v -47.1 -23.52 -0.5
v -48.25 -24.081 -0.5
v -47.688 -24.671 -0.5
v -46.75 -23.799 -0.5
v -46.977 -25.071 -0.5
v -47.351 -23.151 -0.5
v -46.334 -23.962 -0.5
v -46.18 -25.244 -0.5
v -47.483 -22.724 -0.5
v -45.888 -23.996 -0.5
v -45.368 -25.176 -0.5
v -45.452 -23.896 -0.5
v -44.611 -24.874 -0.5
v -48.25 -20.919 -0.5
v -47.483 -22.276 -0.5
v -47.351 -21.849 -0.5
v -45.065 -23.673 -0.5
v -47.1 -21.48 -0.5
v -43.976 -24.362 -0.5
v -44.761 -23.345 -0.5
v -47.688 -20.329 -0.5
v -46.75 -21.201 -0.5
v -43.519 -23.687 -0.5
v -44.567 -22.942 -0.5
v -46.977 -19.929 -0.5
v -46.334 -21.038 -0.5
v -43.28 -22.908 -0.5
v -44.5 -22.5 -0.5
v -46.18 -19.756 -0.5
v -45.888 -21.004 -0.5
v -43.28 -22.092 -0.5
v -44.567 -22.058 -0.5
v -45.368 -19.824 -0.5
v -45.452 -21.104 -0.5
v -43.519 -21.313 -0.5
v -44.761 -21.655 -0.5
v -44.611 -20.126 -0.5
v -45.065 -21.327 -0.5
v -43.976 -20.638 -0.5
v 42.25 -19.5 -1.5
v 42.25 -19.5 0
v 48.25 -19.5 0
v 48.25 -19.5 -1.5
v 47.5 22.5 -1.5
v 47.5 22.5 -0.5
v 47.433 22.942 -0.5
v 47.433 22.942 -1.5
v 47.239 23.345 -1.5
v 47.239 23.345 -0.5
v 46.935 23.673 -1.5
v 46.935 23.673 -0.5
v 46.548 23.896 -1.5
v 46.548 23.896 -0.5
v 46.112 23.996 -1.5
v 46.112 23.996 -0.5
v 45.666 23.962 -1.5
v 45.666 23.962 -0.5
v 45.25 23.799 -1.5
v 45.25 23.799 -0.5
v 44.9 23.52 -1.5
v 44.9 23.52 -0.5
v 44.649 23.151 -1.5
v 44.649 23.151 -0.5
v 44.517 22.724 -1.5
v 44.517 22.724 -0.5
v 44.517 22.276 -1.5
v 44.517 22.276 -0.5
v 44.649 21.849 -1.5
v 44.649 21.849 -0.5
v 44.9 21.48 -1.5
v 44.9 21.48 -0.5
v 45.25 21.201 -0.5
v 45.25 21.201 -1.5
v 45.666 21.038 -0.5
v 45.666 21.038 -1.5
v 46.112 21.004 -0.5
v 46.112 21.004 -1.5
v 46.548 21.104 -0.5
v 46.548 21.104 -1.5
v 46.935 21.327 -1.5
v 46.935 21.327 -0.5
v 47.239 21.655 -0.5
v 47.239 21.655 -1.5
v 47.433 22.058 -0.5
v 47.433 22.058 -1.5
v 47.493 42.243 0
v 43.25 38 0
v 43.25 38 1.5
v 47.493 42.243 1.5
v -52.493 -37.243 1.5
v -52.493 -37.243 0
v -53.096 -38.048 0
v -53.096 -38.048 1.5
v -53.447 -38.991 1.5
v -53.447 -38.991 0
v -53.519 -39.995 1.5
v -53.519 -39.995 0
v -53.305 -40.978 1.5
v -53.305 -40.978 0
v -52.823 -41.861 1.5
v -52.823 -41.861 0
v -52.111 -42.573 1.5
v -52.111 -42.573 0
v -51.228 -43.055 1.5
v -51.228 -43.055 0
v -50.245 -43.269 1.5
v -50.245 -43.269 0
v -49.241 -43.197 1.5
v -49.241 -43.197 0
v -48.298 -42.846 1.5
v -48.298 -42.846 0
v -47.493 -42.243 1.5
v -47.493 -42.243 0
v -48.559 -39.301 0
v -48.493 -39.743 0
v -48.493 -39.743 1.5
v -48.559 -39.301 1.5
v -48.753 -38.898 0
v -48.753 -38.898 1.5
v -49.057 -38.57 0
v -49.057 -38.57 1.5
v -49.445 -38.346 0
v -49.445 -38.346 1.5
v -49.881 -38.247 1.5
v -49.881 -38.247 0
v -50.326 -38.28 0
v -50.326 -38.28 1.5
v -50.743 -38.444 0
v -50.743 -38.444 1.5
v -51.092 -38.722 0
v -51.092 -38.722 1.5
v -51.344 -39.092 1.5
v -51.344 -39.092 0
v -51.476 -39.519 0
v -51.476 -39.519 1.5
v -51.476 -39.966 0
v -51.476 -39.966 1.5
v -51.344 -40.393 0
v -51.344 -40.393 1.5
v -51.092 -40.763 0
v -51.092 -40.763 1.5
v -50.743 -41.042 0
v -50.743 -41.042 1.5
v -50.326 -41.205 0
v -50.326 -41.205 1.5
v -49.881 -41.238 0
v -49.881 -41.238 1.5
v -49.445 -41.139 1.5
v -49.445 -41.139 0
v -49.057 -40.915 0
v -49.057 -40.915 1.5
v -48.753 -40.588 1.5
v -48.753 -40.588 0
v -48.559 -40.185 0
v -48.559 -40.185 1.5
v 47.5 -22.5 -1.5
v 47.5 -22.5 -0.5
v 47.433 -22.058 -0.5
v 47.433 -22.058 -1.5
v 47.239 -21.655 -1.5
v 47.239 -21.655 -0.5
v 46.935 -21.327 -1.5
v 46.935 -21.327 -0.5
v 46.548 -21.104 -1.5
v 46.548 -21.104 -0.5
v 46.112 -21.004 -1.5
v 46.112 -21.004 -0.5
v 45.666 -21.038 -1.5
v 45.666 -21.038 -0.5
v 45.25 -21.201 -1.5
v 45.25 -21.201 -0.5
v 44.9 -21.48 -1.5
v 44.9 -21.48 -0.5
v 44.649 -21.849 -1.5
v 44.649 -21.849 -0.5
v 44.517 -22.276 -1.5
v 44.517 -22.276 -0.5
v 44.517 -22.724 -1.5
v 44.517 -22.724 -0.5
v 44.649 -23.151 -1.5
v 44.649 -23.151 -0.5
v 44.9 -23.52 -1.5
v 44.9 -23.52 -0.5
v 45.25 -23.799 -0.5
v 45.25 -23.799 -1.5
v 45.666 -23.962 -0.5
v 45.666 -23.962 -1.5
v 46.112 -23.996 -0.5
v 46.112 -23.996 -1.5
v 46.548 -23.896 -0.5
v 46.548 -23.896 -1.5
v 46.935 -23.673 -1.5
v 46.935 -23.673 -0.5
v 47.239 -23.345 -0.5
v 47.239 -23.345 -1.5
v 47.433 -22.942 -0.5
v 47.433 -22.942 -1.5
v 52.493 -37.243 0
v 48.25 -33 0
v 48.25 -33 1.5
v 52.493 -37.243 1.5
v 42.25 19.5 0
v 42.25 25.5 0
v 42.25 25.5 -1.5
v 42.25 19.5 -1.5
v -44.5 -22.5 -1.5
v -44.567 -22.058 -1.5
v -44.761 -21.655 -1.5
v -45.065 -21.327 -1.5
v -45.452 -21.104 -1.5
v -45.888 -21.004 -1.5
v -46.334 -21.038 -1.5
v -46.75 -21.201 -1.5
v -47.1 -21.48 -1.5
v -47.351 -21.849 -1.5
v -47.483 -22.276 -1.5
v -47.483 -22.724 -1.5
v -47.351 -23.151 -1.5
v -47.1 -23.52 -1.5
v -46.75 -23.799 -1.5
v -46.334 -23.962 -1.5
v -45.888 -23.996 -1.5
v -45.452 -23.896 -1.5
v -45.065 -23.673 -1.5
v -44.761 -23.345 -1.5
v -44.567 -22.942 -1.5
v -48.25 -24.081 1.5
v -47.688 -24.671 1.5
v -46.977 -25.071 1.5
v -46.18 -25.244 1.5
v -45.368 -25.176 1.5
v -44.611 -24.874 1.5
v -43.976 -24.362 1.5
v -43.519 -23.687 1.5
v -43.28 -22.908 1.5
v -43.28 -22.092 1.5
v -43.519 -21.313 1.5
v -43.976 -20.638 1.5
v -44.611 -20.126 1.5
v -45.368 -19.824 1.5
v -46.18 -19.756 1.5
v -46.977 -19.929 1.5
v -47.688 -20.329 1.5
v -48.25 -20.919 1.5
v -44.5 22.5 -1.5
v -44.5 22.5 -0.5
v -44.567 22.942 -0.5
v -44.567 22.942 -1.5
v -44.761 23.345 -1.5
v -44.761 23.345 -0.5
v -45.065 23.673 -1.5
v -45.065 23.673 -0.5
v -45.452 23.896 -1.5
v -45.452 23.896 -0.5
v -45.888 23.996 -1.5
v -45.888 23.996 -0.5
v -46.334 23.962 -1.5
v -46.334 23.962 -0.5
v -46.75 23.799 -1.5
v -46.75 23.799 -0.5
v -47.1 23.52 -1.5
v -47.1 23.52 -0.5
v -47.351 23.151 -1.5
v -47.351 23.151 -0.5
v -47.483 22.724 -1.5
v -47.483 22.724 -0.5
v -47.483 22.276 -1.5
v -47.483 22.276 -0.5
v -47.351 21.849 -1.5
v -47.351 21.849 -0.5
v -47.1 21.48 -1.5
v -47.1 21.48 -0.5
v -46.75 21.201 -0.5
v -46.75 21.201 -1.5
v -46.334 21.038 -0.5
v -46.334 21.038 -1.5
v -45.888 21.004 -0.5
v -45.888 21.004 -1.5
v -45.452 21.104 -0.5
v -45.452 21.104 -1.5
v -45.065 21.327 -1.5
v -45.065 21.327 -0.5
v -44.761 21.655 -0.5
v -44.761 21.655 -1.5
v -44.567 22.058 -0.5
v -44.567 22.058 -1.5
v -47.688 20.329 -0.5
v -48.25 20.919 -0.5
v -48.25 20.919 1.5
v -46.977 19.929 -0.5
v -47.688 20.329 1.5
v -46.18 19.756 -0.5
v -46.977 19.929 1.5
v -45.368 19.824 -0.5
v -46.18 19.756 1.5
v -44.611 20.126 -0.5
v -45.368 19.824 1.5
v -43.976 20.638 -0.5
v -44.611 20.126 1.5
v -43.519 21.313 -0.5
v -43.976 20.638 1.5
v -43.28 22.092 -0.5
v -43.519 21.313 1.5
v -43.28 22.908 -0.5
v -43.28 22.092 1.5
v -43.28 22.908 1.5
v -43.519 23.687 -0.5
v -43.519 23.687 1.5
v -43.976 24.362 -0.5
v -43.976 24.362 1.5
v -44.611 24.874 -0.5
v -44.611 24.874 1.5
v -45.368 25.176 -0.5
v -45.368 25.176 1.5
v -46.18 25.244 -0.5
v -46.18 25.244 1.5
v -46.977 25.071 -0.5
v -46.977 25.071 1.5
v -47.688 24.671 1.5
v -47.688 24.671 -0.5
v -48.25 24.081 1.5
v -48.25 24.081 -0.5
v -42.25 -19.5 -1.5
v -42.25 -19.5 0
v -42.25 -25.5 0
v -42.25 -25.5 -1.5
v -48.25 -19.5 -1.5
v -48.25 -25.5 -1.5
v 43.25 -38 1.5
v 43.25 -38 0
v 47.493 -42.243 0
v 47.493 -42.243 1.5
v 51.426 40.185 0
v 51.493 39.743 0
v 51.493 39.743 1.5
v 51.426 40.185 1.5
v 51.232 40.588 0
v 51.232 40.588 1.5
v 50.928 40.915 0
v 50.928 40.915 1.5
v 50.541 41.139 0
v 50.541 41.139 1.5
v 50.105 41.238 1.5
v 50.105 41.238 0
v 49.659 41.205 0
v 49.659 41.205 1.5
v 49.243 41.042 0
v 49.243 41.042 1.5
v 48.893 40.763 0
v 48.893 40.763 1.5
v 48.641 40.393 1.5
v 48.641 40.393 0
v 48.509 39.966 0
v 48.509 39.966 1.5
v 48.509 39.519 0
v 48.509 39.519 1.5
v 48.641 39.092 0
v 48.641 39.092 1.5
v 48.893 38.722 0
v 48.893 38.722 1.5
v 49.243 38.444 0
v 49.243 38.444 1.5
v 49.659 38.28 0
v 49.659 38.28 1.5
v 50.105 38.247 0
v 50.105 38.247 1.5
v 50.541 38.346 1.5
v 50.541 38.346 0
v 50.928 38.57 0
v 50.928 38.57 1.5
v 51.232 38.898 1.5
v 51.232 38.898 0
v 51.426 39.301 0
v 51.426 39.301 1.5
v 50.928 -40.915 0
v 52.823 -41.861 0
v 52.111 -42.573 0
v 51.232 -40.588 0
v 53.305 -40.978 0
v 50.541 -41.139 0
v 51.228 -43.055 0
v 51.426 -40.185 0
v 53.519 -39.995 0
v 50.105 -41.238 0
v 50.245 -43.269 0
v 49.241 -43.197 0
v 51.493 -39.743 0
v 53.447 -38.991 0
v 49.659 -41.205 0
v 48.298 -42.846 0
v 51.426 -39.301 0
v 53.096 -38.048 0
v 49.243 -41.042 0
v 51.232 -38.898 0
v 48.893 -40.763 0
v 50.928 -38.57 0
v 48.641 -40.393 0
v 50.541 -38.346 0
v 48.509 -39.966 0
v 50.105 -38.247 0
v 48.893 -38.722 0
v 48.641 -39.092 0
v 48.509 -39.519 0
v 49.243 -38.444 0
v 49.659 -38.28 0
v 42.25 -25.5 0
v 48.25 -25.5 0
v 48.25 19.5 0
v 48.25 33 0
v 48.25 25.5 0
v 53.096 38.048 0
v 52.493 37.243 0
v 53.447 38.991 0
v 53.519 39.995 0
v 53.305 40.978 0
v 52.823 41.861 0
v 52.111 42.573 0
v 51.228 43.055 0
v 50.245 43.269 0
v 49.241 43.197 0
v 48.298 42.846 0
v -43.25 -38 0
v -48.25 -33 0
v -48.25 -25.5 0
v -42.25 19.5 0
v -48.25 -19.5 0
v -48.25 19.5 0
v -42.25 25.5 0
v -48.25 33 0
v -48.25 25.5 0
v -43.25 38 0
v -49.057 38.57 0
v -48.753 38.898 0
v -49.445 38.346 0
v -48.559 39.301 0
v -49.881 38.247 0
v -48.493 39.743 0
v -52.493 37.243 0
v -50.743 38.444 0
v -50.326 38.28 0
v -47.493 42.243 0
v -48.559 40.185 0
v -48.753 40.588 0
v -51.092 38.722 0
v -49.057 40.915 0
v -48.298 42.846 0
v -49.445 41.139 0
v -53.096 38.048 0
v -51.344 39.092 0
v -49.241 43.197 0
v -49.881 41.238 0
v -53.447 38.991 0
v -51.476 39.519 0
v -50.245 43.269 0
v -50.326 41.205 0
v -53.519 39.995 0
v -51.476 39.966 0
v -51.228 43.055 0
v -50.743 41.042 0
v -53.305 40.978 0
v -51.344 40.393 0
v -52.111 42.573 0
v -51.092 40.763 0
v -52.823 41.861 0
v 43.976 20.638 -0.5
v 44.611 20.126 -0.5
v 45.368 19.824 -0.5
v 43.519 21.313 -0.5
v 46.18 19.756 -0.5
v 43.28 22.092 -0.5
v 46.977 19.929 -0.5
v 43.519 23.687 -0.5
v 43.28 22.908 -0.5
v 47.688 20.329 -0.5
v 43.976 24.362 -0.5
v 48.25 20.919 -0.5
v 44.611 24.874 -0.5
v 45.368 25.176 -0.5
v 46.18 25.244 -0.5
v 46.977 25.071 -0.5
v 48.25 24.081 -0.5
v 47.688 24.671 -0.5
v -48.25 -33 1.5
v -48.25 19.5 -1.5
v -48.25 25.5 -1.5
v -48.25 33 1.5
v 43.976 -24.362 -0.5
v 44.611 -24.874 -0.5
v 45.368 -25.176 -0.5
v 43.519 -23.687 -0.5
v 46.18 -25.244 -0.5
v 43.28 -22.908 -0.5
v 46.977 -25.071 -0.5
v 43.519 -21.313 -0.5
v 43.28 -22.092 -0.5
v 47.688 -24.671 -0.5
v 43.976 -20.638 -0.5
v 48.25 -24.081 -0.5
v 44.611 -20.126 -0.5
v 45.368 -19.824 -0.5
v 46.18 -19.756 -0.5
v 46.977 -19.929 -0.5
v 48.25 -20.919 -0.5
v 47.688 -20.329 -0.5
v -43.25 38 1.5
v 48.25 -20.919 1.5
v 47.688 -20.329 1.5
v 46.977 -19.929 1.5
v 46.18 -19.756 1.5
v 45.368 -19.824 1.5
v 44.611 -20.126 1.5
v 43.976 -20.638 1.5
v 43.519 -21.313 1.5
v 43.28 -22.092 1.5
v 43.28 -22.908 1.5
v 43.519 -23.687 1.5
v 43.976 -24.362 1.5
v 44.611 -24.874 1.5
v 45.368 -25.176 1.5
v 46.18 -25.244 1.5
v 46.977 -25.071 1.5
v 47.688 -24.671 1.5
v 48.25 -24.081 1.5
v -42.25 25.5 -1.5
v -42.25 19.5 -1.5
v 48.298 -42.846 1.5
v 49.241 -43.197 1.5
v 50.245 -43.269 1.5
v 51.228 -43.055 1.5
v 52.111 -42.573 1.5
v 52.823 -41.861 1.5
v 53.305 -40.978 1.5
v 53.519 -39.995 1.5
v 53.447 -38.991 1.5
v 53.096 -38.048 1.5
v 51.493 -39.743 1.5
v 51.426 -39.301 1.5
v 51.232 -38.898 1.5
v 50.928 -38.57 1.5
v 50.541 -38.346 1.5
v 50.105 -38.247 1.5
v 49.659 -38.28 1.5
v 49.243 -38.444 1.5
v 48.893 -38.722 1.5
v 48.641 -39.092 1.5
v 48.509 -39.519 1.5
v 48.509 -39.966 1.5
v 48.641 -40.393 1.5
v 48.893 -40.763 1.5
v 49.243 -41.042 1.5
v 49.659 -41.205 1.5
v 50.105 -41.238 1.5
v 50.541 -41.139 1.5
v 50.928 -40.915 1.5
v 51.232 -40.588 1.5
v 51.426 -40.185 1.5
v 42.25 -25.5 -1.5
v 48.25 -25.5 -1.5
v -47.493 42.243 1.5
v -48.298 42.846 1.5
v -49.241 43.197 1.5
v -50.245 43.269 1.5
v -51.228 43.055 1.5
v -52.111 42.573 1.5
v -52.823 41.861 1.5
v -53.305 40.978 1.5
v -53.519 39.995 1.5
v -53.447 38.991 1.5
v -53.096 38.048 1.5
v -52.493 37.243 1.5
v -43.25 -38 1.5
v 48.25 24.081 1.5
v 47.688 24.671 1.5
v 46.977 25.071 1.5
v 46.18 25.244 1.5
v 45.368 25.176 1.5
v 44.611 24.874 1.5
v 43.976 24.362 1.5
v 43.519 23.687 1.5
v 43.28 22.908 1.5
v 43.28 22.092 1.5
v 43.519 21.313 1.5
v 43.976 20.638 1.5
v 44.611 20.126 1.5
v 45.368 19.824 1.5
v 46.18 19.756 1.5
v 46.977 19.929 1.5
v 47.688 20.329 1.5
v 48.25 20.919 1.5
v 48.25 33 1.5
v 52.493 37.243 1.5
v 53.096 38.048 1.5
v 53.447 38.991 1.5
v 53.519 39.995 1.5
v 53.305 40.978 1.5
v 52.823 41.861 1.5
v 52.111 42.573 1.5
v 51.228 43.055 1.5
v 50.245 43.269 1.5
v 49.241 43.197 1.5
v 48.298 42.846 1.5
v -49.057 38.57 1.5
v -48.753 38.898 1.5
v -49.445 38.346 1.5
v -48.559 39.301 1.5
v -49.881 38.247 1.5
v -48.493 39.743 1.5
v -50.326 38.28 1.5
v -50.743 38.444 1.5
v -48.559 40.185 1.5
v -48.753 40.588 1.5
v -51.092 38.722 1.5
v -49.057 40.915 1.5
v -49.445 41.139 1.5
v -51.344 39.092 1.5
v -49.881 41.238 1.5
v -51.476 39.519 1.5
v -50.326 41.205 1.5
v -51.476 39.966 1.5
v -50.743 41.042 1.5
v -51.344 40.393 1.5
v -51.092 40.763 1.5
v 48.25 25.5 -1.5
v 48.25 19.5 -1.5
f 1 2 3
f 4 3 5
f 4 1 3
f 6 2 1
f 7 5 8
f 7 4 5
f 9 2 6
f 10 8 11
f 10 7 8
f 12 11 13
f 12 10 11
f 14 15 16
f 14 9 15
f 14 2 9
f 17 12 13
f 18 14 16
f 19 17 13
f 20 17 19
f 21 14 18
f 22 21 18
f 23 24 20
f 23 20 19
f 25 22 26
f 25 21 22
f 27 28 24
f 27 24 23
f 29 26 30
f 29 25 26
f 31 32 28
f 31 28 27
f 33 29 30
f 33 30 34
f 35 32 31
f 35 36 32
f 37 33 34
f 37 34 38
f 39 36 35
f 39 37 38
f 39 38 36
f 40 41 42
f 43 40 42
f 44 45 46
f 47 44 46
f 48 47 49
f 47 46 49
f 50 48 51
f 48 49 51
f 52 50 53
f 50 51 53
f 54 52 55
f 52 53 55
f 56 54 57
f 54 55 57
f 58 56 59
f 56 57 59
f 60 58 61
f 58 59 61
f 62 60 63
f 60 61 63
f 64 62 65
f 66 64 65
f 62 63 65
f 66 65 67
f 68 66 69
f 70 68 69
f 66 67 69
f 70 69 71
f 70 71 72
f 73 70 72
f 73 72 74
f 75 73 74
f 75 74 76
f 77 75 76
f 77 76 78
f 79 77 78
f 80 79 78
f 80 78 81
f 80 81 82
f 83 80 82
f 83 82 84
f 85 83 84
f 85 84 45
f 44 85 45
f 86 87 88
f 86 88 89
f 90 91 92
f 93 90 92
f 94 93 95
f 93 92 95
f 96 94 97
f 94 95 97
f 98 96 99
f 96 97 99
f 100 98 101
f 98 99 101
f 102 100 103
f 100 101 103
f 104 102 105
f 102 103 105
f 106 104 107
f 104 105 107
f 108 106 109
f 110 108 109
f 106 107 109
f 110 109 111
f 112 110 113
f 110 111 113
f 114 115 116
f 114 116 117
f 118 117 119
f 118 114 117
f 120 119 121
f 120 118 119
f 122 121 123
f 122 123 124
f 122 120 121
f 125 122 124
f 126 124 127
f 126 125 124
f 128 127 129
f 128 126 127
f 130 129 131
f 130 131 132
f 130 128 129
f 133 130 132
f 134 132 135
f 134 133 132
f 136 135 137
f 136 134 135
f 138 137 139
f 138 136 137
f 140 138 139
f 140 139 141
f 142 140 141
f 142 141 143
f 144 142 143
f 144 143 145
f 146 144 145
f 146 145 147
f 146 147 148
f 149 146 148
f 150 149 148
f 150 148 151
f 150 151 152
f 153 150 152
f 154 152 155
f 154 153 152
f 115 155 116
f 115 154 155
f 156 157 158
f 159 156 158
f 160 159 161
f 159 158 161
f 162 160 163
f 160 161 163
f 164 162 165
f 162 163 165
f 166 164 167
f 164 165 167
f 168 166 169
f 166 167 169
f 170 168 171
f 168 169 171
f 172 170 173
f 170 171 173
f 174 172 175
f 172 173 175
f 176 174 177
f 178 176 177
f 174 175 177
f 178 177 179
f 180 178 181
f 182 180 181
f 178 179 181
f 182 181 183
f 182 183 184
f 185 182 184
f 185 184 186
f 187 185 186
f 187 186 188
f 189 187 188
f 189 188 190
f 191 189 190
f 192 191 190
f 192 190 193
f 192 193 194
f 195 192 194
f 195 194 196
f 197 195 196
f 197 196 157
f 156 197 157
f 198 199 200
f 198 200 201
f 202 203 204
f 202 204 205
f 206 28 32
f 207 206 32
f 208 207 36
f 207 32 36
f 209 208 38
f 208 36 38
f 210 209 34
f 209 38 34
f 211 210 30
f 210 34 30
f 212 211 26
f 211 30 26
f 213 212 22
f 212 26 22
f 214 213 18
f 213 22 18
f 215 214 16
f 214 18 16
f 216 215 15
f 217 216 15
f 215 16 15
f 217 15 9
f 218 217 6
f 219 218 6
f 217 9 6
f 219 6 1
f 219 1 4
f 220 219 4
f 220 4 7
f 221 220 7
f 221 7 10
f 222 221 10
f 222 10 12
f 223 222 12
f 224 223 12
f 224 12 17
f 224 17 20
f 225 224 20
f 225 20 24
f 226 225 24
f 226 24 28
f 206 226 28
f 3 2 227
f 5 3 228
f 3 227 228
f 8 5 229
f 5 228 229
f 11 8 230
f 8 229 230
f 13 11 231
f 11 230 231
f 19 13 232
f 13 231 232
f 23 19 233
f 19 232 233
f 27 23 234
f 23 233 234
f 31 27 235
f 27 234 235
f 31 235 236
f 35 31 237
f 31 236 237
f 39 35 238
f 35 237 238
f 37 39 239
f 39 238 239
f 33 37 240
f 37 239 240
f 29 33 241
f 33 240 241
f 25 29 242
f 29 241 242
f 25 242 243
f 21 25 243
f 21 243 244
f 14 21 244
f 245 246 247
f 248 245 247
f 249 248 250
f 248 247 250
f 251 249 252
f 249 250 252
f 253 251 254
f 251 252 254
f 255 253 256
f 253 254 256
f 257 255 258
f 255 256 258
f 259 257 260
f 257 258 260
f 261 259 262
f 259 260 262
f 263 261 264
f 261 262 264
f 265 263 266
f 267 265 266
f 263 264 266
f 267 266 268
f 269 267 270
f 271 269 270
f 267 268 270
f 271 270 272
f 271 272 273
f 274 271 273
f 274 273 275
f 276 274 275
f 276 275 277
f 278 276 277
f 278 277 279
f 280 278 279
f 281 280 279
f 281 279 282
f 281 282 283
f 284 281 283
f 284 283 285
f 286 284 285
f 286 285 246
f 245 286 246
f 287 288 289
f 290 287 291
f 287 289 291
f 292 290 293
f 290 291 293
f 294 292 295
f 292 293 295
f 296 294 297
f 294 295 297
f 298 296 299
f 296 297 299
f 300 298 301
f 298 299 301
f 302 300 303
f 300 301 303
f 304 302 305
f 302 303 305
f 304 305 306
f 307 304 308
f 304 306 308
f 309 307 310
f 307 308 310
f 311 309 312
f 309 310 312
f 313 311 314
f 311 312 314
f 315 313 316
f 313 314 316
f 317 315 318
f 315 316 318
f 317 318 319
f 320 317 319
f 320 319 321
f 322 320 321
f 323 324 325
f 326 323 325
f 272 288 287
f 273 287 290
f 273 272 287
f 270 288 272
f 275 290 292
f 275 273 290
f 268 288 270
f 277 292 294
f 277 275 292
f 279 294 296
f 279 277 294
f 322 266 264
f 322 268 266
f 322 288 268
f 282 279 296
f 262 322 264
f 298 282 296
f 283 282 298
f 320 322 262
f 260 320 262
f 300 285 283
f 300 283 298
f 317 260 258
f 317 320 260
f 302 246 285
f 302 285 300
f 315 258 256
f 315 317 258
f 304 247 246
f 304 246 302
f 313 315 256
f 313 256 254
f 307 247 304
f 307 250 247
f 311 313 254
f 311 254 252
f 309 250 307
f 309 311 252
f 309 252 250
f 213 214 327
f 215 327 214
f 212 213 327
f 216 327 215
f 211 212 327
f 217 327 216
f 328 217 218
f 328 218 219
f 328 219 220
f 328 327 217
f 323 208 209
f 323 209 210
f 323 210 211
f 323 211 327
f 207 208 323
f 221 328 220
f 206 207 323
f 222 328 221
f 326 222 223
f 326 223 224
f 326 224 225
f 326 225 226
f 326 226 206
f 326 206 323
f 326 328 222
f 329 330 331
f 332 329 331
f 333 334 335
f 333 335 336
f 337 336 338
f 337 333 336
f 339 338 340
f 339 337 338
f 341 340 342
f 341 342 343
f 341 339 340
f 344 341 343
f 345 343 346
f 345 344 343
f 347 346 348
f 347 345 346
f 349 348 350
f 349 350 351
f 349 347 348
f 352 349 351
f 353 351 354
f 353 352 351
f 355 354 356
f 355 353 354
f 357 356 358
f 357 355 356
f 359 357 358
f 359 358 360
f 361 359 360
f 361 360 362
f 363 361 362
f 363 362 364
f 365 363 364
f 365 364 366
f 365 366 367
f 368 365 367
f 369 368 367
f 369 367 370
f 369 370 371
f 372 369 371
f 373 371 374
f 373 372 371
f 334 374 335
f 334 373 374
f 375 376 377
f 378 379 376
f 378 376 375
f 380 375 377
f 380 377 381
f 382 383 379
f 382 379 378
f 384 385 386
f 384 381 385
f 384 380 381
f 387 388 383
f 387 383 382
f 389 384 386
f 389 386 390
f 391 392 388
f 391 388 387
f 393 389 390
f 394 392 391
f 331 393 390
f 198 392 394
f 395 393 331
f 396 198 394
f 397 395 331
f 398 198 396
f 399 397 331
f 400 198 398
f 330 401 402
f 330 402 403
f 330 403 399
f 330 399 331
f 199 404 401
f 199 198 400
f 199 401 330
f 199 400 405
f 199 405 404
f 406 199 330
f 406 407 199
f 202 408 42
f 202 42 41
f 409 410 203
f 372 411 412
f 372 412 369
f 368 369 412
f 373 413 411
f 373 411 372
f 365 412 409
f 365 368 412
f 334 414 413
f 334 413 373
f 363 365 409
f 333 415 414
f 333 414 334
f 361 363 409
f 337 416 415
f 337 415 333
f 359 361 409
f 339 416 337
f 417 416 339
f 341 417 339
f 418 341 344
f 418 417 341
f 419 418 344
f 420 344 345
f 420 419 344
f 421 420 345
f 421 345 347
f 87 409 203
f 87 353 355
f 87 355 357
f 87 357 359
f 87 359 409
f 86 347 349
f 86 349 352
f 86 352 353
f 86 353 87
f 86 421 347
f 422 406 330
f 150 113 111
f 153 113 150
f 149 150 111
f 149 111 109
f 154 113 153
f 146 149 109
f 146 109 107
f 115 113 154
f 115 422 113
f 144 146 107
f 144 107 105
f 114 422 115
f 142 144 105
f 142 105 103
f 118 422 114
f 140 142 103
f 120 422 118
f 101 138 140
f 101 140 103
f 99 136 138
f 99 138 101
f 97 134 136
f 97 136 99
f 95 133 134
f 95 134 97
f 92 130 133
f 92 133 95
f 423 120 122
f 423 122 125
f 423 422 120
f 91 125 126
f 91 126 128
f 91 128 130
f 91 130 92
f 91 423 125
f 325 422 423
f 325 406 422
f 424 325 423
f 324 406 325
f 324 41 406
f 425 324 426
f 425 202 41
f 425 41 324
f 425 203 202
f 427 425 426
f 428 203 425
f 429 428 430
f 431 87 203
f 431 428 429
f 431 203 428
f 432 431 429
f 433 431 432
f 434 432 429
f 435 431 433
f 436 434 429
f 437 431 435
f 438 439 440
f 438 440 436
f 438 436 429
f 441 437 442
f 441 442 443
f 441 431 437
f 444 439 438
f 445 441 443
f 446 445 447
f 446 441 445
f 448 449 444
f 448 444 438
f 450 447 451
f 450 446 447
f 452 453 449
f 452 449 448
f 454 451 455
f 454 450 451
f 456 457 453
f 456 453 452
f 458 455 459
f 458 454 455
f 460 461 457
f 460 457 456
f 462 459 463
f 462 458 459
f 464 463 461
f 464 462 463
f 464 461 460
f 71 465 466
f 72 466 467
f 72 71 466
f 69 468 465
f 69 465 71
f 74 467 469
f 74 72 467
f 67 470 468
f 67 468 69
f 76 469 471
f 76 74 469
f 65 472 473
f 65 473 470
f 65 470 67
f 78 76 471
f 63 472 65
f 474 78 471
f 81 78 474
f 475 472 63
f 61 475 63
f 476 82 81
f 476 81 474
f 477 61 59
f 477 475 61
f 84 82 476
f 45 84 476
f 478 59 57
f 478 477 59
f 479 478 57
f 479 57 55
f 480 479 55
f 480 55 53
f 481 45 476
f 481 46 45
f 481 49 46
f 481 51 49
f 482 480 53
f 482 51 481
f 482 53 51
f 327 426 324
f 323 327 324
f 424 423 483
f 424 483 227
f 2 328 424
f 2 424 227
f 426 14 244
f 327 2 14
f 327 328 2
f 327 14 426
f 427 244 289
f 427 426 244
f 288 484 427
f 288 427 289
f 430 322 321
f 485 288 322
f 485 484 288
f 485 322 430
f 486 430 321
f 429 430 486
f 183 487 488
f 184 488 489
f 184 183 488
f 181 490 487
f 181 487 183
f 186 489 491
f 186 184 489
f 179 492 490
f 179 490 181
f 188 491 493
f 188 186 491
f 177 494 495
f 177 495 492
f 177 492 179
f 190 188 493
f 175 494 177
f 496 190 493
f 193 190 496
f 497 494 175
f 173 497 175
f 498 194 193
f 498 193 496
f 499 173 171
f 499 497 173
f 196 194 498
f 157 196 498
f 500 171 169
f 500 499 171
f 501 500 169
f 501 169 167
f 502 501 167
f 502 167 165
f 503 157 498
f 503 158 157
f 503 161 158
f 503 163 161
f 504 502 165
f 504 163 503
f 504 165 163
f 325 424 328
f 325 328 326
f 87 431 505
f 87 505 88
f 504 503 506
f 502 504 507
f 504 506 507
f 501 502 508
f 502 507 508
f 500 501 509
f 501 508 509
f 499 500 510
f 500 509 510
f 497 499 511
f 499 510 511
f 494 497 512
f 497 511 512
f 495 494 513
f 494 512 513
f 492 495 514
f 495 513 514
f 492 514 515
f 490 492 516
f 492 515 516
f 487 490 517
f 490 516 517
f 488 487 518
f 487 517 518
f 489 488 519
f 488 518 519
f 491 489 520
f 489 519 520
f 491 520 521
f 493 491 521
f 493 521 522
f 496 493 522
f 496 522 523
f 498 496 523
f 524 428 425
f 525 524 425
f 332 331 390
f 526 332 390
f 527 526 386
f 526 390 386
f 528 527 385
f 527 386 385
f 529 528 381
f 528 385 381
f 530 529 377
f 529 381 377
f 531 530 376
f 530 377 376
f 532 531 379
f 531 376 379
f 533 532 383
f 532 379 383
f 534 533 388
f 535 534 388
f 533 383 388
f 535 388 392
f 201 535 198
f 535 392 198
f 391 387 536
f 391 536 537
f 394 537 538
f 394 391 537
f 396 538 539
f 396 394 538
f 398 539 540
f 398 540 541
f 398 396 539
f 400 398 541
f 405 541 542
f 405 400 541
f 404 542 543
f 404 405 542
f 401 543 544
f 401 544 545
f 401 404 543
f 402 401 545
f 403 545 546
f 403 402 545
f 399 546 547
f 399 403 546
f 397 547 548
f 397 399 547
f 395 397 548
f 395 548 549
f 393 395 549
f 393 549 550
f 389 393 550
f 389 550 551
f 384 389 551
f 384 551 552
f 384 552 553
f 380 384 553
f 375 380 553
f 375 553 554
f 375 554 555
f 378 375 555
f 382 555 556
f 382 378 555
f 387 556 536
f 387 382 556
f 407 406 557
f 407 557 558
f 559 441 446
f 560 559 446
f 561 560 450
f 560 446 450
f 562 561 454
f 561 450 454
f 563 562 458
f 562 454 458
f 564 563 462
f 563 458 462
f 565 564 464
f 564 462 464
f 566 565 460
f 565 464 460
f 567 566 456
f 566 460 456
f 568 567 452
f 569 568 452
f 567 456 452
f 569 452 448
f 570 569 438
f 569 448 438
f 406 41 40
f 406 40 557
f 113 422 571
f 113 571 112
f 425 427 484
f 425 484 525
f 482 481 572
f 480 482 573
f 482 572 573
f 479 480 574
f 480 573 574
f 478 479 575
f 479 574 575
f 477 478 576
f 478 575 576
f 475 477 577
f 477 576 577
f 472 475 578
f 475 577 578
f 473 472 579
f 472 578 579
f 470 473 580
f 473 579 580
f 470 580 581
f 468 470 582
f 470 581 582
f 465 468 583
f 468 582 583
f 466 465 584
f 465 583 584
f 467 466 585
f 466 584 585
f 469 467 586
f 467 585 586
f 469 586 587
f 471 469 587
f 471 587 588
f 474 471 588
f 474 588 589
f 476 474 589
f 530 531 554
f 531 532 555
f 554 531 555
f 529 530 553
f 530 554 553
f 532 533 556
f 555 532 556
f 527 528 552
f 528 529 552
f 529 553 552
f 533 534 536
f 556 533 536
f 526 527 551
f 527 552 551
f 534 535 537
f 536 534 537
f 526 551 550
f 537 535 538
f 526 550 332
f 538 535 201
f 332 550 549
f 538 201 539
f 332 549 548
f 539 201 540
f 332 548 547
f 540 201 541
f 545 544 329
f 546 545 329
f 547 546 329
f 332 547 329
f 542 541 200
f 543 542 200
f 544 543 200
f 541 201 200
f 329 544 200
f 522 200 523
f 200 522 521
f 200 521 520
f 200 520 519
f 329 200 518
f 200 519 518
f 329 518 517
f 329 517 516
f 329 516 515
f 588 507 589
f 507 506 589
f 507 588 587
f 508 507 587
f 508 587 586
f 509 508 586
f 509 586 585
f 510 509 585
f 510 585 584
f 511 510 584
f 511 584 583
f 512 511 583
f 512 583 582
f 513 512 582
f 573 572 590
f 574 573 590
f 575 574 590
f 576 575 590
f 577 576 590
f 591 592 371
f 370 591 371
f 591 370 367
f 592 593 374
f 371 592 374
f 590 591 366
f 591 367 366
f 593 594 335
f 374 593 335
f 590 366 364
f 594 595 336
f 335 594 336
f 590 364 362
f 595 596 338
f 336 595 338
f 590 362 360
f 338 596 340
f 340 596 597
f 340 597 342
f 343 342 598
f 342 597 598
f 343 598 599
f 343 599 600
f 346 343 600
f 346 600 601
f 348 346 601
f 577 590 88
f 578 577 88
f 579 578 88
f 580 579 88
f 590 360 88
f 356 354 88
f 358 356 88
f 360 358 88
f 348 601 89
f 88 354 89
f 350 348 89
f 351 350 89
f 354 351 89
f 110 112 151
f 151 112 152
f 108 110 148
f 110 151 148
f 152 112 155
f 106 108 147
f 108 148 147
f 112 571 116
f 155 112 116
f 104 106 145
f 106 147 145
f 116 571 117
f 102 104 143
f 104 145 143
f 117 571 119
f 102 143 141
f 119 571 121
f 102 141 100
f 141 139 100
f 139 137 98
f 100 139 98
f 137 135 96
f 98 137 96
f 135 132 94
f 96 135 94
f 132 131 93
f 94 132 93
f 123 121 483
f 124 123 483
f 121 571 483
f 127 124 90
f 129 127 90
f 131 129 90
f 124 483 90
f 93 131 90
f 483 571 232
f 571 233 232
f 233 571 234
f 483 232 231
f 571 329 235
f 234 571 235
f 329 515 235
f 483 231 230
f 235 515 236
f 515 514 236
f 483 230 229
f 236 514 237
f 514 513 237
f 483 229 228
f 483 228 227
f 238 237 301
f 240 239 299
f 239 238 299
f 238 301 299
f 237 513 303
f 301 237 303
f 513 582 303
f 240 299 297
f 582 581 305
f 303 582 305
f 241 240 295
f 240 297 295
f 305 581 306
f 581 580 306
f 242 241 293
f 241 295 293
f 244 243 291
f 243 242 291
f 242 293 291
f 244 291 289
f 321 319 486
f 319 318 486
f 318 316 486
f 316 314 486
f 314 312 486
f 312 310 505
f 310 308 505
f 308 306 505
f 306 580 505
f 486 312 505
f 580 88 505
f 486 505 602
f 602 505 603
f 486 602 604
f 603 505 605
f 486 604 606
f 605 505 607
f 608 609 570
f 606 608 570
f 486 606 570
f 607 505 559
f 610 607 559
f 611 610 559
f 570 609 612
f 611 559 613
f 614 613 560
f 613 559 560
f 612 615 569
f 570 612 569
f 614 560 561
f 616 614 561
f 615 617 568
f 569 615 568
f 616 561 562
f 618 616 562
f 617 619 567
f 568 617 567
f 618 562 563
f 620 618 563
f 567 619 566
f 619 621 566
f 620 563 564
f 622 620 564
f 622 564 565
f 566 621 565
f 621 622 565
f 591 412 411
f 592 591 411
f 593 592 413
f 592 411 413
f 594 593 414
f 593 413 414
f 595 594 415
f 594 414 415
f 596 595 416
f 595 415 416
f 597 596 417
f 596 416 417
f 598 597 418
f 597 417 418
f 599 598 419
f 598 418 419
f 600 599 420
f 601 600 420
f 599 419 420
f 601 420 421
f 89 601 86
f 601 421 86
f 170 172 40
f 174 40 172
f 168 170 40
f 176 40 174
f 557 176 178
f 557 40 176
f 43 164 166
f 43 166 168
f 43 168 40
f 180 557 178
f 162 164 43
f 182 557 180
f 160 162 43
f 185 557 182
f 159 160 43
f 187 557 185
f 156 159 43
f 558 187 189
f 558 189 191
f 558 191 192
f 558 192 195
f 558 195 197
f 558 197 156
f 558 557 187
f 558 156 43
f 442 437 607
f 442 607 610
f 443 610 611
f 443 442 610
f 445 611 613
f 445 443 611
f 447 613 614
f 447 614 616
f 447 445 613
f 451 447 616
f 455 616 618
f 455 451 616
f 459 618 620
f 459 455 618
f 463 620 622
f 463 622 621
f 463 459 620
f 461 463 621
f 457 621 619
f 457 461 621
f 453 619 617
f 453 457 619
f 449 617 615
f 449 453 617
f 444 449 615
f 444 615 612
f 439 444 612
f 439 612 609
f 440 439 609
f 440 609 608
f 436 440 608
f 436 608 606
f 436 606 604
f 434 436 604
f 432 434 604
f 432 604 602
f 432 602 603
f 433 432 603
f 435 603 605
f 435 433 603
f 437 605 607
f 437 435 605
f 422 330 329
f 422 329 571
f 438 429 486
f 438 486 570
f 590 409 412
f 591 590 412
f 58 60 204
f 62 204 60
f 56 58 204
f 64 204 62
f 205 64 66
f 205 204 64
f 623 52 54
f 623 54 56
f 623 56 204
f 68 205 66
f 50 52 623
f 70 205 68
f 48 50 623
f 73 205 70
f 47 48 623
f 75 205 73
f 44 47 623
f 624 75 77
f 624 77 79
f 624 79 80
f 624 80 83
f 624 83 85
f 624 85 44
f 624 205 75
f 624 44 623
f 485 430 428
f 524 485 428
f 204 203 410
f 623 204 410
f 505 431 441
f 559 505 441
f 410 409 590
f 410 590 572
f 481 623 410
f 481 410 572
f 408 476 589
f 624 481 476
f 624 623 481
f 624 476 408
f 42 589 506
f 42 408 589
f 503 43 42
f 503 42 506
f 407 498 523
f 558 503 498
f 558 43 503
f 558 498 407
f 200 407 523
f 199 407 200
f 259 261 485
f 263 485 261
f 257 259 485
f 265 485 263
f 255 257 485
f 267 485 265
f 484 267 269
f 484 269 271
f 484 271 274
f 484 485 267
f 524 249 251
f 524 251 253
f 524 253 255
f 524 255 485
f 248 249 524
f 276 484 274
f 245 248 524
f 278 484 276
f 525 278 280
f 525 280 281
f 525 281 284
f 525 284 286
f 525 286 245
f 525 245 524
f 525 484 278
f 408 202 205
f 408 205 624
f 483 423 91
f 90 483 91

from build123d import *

# Parameters (mm, degrees)
SKETCH_R        = 1.5
PAD_DEPTH       = 1.5
SKETCH001_W     = 6
SKETCH001_H     = 6
PAD001_DEPTH    = 1.5
SKETCH002_R     = 1.5
POCKET_DEPTH    = 3.001
SKETCH003_R     = 2.75
POCKET001_DEPTH = 2


with BuildPart() as part:
    # Sketch → Pad (new body)
    with BuildSketch(Plane.XY):
        with BuildLine():
            Line((-48.25, -33), (-48.25, 33))
            Line((-48.25, 33), (-52.492641, 37.242641))
            ThreePointArc((-47.492641, 42.242641), (-52.492641, 42.242641), (-52.492641, 37.242641))
            Line((-43.25, 38), (-47.492641, 42.242641))
            Line((-43.25, 38), (43.25, 38))
            Line((43.25, 38), (47.492641, 42.242641))
            ThreePointArc((52.492641, 37.242641), (52.492641, 42.242641), (47.492641, 42.242641))
            Line((48.25, 33), (52.492641, 37.242641))
            Line((48.25, 33), (48.25, -33))
            Line((48.25, -33), (52.492641, -37.242641))
            ThreePointArc((47.492641, -42.242641), (52.492641, -42.242641), (52.492641, -37.242641))
            Line((43.25, -38), (47.492641, -42.242641))
            Line((43.25, -38), (-43.25, -38))
            Line((-43.25, -38), (-47.492641, -42.242641))
            ThreePointArc((-52.492641, -37.242641), (-52.492641, -42.242641), (-47.492641, -42.242641))
            Line((-48.25, -33), (-52.492641, -37.242641))
        make_face()
        with Locations((49.992641, -39.742641)):
            Circle(SKETCH_R, mode=Mode.SUBTRACT)
        with Locations((-49.992641, -39.742641)):
            Circle(SKETCH_R, mode=Mode.SUBTRACT)
        with Locations((-49.992641, 39.742641)):
            Circle(SKETCH_R, mode=Mode.SUBTRACT)
        with Locations((49.992641, 39.742641)):
            Circle(SKETCH_R, mode=Mode.SUBTRACT)
    extrude(amount=PAD_DEPTH)

    # Sketch001 (on Face21 of Pad) → Pad001 (join)
    with BuildSketch(Plane(origin=(0, 0, 0), x_dir=(1, 0, 0), z_dir=(0, 0, -1))):
        with Locations((-45.25, 22.5)):
            Rectangle(SKETCH001_W, SKETCH001_H)
        with Locations((-45.25, -22.5)):
            Rectangle(SKETCH001_W, SKETCH001_H)
        with Locations((45.25, 22.5)):
            Rectangle(SKETCH001_W, SKETCH001_H)
        with Locations((45.25, -22.5)):
            Rectangle(SKETCH001_W, SKETCH001_H)
    extrude(amount=PAD001_DEPTH)

    # Sketch002 (on Face5 of Pad001) → Pocket (cut, through all)
    with BuildSketch(Plane.XY.offset(1.5)):
        with Locations((-46, 22.5)):
            Circle(SKETCH002_R)
        with Locations((-46, -22.5)):
            Circle(SKETCH002_R)
        with Locations((46, 22.5)):
            Circle(SKETCH002_R)
        with Locations((46, -22.5)):
            Circle(SKETCH002_R)
    extrude(amount=-POCKET_DEPTH, mode=Mode.SUBTRACT)

    # Sketch003 (on Face5 of Pocket) → Pocket001 (cut)
    with BuildSketch(Plane.XY.offset(1.5)):
        with Locations((46, 22.5)):
            Circle(SKETCH003_R)
        with Locations((-46, 22.5)):
            Circle(SKETCH003_R)
        with Locations((-46, -22.5)):
            Circle(SKETCH003_R)
        with Locations((46, -22.5)):
            Circle(SKETCH003_R)
    extrude(amount=-POCKET001_DEPTH, mode=Mode.SUBTRACT)


solid = part.part
